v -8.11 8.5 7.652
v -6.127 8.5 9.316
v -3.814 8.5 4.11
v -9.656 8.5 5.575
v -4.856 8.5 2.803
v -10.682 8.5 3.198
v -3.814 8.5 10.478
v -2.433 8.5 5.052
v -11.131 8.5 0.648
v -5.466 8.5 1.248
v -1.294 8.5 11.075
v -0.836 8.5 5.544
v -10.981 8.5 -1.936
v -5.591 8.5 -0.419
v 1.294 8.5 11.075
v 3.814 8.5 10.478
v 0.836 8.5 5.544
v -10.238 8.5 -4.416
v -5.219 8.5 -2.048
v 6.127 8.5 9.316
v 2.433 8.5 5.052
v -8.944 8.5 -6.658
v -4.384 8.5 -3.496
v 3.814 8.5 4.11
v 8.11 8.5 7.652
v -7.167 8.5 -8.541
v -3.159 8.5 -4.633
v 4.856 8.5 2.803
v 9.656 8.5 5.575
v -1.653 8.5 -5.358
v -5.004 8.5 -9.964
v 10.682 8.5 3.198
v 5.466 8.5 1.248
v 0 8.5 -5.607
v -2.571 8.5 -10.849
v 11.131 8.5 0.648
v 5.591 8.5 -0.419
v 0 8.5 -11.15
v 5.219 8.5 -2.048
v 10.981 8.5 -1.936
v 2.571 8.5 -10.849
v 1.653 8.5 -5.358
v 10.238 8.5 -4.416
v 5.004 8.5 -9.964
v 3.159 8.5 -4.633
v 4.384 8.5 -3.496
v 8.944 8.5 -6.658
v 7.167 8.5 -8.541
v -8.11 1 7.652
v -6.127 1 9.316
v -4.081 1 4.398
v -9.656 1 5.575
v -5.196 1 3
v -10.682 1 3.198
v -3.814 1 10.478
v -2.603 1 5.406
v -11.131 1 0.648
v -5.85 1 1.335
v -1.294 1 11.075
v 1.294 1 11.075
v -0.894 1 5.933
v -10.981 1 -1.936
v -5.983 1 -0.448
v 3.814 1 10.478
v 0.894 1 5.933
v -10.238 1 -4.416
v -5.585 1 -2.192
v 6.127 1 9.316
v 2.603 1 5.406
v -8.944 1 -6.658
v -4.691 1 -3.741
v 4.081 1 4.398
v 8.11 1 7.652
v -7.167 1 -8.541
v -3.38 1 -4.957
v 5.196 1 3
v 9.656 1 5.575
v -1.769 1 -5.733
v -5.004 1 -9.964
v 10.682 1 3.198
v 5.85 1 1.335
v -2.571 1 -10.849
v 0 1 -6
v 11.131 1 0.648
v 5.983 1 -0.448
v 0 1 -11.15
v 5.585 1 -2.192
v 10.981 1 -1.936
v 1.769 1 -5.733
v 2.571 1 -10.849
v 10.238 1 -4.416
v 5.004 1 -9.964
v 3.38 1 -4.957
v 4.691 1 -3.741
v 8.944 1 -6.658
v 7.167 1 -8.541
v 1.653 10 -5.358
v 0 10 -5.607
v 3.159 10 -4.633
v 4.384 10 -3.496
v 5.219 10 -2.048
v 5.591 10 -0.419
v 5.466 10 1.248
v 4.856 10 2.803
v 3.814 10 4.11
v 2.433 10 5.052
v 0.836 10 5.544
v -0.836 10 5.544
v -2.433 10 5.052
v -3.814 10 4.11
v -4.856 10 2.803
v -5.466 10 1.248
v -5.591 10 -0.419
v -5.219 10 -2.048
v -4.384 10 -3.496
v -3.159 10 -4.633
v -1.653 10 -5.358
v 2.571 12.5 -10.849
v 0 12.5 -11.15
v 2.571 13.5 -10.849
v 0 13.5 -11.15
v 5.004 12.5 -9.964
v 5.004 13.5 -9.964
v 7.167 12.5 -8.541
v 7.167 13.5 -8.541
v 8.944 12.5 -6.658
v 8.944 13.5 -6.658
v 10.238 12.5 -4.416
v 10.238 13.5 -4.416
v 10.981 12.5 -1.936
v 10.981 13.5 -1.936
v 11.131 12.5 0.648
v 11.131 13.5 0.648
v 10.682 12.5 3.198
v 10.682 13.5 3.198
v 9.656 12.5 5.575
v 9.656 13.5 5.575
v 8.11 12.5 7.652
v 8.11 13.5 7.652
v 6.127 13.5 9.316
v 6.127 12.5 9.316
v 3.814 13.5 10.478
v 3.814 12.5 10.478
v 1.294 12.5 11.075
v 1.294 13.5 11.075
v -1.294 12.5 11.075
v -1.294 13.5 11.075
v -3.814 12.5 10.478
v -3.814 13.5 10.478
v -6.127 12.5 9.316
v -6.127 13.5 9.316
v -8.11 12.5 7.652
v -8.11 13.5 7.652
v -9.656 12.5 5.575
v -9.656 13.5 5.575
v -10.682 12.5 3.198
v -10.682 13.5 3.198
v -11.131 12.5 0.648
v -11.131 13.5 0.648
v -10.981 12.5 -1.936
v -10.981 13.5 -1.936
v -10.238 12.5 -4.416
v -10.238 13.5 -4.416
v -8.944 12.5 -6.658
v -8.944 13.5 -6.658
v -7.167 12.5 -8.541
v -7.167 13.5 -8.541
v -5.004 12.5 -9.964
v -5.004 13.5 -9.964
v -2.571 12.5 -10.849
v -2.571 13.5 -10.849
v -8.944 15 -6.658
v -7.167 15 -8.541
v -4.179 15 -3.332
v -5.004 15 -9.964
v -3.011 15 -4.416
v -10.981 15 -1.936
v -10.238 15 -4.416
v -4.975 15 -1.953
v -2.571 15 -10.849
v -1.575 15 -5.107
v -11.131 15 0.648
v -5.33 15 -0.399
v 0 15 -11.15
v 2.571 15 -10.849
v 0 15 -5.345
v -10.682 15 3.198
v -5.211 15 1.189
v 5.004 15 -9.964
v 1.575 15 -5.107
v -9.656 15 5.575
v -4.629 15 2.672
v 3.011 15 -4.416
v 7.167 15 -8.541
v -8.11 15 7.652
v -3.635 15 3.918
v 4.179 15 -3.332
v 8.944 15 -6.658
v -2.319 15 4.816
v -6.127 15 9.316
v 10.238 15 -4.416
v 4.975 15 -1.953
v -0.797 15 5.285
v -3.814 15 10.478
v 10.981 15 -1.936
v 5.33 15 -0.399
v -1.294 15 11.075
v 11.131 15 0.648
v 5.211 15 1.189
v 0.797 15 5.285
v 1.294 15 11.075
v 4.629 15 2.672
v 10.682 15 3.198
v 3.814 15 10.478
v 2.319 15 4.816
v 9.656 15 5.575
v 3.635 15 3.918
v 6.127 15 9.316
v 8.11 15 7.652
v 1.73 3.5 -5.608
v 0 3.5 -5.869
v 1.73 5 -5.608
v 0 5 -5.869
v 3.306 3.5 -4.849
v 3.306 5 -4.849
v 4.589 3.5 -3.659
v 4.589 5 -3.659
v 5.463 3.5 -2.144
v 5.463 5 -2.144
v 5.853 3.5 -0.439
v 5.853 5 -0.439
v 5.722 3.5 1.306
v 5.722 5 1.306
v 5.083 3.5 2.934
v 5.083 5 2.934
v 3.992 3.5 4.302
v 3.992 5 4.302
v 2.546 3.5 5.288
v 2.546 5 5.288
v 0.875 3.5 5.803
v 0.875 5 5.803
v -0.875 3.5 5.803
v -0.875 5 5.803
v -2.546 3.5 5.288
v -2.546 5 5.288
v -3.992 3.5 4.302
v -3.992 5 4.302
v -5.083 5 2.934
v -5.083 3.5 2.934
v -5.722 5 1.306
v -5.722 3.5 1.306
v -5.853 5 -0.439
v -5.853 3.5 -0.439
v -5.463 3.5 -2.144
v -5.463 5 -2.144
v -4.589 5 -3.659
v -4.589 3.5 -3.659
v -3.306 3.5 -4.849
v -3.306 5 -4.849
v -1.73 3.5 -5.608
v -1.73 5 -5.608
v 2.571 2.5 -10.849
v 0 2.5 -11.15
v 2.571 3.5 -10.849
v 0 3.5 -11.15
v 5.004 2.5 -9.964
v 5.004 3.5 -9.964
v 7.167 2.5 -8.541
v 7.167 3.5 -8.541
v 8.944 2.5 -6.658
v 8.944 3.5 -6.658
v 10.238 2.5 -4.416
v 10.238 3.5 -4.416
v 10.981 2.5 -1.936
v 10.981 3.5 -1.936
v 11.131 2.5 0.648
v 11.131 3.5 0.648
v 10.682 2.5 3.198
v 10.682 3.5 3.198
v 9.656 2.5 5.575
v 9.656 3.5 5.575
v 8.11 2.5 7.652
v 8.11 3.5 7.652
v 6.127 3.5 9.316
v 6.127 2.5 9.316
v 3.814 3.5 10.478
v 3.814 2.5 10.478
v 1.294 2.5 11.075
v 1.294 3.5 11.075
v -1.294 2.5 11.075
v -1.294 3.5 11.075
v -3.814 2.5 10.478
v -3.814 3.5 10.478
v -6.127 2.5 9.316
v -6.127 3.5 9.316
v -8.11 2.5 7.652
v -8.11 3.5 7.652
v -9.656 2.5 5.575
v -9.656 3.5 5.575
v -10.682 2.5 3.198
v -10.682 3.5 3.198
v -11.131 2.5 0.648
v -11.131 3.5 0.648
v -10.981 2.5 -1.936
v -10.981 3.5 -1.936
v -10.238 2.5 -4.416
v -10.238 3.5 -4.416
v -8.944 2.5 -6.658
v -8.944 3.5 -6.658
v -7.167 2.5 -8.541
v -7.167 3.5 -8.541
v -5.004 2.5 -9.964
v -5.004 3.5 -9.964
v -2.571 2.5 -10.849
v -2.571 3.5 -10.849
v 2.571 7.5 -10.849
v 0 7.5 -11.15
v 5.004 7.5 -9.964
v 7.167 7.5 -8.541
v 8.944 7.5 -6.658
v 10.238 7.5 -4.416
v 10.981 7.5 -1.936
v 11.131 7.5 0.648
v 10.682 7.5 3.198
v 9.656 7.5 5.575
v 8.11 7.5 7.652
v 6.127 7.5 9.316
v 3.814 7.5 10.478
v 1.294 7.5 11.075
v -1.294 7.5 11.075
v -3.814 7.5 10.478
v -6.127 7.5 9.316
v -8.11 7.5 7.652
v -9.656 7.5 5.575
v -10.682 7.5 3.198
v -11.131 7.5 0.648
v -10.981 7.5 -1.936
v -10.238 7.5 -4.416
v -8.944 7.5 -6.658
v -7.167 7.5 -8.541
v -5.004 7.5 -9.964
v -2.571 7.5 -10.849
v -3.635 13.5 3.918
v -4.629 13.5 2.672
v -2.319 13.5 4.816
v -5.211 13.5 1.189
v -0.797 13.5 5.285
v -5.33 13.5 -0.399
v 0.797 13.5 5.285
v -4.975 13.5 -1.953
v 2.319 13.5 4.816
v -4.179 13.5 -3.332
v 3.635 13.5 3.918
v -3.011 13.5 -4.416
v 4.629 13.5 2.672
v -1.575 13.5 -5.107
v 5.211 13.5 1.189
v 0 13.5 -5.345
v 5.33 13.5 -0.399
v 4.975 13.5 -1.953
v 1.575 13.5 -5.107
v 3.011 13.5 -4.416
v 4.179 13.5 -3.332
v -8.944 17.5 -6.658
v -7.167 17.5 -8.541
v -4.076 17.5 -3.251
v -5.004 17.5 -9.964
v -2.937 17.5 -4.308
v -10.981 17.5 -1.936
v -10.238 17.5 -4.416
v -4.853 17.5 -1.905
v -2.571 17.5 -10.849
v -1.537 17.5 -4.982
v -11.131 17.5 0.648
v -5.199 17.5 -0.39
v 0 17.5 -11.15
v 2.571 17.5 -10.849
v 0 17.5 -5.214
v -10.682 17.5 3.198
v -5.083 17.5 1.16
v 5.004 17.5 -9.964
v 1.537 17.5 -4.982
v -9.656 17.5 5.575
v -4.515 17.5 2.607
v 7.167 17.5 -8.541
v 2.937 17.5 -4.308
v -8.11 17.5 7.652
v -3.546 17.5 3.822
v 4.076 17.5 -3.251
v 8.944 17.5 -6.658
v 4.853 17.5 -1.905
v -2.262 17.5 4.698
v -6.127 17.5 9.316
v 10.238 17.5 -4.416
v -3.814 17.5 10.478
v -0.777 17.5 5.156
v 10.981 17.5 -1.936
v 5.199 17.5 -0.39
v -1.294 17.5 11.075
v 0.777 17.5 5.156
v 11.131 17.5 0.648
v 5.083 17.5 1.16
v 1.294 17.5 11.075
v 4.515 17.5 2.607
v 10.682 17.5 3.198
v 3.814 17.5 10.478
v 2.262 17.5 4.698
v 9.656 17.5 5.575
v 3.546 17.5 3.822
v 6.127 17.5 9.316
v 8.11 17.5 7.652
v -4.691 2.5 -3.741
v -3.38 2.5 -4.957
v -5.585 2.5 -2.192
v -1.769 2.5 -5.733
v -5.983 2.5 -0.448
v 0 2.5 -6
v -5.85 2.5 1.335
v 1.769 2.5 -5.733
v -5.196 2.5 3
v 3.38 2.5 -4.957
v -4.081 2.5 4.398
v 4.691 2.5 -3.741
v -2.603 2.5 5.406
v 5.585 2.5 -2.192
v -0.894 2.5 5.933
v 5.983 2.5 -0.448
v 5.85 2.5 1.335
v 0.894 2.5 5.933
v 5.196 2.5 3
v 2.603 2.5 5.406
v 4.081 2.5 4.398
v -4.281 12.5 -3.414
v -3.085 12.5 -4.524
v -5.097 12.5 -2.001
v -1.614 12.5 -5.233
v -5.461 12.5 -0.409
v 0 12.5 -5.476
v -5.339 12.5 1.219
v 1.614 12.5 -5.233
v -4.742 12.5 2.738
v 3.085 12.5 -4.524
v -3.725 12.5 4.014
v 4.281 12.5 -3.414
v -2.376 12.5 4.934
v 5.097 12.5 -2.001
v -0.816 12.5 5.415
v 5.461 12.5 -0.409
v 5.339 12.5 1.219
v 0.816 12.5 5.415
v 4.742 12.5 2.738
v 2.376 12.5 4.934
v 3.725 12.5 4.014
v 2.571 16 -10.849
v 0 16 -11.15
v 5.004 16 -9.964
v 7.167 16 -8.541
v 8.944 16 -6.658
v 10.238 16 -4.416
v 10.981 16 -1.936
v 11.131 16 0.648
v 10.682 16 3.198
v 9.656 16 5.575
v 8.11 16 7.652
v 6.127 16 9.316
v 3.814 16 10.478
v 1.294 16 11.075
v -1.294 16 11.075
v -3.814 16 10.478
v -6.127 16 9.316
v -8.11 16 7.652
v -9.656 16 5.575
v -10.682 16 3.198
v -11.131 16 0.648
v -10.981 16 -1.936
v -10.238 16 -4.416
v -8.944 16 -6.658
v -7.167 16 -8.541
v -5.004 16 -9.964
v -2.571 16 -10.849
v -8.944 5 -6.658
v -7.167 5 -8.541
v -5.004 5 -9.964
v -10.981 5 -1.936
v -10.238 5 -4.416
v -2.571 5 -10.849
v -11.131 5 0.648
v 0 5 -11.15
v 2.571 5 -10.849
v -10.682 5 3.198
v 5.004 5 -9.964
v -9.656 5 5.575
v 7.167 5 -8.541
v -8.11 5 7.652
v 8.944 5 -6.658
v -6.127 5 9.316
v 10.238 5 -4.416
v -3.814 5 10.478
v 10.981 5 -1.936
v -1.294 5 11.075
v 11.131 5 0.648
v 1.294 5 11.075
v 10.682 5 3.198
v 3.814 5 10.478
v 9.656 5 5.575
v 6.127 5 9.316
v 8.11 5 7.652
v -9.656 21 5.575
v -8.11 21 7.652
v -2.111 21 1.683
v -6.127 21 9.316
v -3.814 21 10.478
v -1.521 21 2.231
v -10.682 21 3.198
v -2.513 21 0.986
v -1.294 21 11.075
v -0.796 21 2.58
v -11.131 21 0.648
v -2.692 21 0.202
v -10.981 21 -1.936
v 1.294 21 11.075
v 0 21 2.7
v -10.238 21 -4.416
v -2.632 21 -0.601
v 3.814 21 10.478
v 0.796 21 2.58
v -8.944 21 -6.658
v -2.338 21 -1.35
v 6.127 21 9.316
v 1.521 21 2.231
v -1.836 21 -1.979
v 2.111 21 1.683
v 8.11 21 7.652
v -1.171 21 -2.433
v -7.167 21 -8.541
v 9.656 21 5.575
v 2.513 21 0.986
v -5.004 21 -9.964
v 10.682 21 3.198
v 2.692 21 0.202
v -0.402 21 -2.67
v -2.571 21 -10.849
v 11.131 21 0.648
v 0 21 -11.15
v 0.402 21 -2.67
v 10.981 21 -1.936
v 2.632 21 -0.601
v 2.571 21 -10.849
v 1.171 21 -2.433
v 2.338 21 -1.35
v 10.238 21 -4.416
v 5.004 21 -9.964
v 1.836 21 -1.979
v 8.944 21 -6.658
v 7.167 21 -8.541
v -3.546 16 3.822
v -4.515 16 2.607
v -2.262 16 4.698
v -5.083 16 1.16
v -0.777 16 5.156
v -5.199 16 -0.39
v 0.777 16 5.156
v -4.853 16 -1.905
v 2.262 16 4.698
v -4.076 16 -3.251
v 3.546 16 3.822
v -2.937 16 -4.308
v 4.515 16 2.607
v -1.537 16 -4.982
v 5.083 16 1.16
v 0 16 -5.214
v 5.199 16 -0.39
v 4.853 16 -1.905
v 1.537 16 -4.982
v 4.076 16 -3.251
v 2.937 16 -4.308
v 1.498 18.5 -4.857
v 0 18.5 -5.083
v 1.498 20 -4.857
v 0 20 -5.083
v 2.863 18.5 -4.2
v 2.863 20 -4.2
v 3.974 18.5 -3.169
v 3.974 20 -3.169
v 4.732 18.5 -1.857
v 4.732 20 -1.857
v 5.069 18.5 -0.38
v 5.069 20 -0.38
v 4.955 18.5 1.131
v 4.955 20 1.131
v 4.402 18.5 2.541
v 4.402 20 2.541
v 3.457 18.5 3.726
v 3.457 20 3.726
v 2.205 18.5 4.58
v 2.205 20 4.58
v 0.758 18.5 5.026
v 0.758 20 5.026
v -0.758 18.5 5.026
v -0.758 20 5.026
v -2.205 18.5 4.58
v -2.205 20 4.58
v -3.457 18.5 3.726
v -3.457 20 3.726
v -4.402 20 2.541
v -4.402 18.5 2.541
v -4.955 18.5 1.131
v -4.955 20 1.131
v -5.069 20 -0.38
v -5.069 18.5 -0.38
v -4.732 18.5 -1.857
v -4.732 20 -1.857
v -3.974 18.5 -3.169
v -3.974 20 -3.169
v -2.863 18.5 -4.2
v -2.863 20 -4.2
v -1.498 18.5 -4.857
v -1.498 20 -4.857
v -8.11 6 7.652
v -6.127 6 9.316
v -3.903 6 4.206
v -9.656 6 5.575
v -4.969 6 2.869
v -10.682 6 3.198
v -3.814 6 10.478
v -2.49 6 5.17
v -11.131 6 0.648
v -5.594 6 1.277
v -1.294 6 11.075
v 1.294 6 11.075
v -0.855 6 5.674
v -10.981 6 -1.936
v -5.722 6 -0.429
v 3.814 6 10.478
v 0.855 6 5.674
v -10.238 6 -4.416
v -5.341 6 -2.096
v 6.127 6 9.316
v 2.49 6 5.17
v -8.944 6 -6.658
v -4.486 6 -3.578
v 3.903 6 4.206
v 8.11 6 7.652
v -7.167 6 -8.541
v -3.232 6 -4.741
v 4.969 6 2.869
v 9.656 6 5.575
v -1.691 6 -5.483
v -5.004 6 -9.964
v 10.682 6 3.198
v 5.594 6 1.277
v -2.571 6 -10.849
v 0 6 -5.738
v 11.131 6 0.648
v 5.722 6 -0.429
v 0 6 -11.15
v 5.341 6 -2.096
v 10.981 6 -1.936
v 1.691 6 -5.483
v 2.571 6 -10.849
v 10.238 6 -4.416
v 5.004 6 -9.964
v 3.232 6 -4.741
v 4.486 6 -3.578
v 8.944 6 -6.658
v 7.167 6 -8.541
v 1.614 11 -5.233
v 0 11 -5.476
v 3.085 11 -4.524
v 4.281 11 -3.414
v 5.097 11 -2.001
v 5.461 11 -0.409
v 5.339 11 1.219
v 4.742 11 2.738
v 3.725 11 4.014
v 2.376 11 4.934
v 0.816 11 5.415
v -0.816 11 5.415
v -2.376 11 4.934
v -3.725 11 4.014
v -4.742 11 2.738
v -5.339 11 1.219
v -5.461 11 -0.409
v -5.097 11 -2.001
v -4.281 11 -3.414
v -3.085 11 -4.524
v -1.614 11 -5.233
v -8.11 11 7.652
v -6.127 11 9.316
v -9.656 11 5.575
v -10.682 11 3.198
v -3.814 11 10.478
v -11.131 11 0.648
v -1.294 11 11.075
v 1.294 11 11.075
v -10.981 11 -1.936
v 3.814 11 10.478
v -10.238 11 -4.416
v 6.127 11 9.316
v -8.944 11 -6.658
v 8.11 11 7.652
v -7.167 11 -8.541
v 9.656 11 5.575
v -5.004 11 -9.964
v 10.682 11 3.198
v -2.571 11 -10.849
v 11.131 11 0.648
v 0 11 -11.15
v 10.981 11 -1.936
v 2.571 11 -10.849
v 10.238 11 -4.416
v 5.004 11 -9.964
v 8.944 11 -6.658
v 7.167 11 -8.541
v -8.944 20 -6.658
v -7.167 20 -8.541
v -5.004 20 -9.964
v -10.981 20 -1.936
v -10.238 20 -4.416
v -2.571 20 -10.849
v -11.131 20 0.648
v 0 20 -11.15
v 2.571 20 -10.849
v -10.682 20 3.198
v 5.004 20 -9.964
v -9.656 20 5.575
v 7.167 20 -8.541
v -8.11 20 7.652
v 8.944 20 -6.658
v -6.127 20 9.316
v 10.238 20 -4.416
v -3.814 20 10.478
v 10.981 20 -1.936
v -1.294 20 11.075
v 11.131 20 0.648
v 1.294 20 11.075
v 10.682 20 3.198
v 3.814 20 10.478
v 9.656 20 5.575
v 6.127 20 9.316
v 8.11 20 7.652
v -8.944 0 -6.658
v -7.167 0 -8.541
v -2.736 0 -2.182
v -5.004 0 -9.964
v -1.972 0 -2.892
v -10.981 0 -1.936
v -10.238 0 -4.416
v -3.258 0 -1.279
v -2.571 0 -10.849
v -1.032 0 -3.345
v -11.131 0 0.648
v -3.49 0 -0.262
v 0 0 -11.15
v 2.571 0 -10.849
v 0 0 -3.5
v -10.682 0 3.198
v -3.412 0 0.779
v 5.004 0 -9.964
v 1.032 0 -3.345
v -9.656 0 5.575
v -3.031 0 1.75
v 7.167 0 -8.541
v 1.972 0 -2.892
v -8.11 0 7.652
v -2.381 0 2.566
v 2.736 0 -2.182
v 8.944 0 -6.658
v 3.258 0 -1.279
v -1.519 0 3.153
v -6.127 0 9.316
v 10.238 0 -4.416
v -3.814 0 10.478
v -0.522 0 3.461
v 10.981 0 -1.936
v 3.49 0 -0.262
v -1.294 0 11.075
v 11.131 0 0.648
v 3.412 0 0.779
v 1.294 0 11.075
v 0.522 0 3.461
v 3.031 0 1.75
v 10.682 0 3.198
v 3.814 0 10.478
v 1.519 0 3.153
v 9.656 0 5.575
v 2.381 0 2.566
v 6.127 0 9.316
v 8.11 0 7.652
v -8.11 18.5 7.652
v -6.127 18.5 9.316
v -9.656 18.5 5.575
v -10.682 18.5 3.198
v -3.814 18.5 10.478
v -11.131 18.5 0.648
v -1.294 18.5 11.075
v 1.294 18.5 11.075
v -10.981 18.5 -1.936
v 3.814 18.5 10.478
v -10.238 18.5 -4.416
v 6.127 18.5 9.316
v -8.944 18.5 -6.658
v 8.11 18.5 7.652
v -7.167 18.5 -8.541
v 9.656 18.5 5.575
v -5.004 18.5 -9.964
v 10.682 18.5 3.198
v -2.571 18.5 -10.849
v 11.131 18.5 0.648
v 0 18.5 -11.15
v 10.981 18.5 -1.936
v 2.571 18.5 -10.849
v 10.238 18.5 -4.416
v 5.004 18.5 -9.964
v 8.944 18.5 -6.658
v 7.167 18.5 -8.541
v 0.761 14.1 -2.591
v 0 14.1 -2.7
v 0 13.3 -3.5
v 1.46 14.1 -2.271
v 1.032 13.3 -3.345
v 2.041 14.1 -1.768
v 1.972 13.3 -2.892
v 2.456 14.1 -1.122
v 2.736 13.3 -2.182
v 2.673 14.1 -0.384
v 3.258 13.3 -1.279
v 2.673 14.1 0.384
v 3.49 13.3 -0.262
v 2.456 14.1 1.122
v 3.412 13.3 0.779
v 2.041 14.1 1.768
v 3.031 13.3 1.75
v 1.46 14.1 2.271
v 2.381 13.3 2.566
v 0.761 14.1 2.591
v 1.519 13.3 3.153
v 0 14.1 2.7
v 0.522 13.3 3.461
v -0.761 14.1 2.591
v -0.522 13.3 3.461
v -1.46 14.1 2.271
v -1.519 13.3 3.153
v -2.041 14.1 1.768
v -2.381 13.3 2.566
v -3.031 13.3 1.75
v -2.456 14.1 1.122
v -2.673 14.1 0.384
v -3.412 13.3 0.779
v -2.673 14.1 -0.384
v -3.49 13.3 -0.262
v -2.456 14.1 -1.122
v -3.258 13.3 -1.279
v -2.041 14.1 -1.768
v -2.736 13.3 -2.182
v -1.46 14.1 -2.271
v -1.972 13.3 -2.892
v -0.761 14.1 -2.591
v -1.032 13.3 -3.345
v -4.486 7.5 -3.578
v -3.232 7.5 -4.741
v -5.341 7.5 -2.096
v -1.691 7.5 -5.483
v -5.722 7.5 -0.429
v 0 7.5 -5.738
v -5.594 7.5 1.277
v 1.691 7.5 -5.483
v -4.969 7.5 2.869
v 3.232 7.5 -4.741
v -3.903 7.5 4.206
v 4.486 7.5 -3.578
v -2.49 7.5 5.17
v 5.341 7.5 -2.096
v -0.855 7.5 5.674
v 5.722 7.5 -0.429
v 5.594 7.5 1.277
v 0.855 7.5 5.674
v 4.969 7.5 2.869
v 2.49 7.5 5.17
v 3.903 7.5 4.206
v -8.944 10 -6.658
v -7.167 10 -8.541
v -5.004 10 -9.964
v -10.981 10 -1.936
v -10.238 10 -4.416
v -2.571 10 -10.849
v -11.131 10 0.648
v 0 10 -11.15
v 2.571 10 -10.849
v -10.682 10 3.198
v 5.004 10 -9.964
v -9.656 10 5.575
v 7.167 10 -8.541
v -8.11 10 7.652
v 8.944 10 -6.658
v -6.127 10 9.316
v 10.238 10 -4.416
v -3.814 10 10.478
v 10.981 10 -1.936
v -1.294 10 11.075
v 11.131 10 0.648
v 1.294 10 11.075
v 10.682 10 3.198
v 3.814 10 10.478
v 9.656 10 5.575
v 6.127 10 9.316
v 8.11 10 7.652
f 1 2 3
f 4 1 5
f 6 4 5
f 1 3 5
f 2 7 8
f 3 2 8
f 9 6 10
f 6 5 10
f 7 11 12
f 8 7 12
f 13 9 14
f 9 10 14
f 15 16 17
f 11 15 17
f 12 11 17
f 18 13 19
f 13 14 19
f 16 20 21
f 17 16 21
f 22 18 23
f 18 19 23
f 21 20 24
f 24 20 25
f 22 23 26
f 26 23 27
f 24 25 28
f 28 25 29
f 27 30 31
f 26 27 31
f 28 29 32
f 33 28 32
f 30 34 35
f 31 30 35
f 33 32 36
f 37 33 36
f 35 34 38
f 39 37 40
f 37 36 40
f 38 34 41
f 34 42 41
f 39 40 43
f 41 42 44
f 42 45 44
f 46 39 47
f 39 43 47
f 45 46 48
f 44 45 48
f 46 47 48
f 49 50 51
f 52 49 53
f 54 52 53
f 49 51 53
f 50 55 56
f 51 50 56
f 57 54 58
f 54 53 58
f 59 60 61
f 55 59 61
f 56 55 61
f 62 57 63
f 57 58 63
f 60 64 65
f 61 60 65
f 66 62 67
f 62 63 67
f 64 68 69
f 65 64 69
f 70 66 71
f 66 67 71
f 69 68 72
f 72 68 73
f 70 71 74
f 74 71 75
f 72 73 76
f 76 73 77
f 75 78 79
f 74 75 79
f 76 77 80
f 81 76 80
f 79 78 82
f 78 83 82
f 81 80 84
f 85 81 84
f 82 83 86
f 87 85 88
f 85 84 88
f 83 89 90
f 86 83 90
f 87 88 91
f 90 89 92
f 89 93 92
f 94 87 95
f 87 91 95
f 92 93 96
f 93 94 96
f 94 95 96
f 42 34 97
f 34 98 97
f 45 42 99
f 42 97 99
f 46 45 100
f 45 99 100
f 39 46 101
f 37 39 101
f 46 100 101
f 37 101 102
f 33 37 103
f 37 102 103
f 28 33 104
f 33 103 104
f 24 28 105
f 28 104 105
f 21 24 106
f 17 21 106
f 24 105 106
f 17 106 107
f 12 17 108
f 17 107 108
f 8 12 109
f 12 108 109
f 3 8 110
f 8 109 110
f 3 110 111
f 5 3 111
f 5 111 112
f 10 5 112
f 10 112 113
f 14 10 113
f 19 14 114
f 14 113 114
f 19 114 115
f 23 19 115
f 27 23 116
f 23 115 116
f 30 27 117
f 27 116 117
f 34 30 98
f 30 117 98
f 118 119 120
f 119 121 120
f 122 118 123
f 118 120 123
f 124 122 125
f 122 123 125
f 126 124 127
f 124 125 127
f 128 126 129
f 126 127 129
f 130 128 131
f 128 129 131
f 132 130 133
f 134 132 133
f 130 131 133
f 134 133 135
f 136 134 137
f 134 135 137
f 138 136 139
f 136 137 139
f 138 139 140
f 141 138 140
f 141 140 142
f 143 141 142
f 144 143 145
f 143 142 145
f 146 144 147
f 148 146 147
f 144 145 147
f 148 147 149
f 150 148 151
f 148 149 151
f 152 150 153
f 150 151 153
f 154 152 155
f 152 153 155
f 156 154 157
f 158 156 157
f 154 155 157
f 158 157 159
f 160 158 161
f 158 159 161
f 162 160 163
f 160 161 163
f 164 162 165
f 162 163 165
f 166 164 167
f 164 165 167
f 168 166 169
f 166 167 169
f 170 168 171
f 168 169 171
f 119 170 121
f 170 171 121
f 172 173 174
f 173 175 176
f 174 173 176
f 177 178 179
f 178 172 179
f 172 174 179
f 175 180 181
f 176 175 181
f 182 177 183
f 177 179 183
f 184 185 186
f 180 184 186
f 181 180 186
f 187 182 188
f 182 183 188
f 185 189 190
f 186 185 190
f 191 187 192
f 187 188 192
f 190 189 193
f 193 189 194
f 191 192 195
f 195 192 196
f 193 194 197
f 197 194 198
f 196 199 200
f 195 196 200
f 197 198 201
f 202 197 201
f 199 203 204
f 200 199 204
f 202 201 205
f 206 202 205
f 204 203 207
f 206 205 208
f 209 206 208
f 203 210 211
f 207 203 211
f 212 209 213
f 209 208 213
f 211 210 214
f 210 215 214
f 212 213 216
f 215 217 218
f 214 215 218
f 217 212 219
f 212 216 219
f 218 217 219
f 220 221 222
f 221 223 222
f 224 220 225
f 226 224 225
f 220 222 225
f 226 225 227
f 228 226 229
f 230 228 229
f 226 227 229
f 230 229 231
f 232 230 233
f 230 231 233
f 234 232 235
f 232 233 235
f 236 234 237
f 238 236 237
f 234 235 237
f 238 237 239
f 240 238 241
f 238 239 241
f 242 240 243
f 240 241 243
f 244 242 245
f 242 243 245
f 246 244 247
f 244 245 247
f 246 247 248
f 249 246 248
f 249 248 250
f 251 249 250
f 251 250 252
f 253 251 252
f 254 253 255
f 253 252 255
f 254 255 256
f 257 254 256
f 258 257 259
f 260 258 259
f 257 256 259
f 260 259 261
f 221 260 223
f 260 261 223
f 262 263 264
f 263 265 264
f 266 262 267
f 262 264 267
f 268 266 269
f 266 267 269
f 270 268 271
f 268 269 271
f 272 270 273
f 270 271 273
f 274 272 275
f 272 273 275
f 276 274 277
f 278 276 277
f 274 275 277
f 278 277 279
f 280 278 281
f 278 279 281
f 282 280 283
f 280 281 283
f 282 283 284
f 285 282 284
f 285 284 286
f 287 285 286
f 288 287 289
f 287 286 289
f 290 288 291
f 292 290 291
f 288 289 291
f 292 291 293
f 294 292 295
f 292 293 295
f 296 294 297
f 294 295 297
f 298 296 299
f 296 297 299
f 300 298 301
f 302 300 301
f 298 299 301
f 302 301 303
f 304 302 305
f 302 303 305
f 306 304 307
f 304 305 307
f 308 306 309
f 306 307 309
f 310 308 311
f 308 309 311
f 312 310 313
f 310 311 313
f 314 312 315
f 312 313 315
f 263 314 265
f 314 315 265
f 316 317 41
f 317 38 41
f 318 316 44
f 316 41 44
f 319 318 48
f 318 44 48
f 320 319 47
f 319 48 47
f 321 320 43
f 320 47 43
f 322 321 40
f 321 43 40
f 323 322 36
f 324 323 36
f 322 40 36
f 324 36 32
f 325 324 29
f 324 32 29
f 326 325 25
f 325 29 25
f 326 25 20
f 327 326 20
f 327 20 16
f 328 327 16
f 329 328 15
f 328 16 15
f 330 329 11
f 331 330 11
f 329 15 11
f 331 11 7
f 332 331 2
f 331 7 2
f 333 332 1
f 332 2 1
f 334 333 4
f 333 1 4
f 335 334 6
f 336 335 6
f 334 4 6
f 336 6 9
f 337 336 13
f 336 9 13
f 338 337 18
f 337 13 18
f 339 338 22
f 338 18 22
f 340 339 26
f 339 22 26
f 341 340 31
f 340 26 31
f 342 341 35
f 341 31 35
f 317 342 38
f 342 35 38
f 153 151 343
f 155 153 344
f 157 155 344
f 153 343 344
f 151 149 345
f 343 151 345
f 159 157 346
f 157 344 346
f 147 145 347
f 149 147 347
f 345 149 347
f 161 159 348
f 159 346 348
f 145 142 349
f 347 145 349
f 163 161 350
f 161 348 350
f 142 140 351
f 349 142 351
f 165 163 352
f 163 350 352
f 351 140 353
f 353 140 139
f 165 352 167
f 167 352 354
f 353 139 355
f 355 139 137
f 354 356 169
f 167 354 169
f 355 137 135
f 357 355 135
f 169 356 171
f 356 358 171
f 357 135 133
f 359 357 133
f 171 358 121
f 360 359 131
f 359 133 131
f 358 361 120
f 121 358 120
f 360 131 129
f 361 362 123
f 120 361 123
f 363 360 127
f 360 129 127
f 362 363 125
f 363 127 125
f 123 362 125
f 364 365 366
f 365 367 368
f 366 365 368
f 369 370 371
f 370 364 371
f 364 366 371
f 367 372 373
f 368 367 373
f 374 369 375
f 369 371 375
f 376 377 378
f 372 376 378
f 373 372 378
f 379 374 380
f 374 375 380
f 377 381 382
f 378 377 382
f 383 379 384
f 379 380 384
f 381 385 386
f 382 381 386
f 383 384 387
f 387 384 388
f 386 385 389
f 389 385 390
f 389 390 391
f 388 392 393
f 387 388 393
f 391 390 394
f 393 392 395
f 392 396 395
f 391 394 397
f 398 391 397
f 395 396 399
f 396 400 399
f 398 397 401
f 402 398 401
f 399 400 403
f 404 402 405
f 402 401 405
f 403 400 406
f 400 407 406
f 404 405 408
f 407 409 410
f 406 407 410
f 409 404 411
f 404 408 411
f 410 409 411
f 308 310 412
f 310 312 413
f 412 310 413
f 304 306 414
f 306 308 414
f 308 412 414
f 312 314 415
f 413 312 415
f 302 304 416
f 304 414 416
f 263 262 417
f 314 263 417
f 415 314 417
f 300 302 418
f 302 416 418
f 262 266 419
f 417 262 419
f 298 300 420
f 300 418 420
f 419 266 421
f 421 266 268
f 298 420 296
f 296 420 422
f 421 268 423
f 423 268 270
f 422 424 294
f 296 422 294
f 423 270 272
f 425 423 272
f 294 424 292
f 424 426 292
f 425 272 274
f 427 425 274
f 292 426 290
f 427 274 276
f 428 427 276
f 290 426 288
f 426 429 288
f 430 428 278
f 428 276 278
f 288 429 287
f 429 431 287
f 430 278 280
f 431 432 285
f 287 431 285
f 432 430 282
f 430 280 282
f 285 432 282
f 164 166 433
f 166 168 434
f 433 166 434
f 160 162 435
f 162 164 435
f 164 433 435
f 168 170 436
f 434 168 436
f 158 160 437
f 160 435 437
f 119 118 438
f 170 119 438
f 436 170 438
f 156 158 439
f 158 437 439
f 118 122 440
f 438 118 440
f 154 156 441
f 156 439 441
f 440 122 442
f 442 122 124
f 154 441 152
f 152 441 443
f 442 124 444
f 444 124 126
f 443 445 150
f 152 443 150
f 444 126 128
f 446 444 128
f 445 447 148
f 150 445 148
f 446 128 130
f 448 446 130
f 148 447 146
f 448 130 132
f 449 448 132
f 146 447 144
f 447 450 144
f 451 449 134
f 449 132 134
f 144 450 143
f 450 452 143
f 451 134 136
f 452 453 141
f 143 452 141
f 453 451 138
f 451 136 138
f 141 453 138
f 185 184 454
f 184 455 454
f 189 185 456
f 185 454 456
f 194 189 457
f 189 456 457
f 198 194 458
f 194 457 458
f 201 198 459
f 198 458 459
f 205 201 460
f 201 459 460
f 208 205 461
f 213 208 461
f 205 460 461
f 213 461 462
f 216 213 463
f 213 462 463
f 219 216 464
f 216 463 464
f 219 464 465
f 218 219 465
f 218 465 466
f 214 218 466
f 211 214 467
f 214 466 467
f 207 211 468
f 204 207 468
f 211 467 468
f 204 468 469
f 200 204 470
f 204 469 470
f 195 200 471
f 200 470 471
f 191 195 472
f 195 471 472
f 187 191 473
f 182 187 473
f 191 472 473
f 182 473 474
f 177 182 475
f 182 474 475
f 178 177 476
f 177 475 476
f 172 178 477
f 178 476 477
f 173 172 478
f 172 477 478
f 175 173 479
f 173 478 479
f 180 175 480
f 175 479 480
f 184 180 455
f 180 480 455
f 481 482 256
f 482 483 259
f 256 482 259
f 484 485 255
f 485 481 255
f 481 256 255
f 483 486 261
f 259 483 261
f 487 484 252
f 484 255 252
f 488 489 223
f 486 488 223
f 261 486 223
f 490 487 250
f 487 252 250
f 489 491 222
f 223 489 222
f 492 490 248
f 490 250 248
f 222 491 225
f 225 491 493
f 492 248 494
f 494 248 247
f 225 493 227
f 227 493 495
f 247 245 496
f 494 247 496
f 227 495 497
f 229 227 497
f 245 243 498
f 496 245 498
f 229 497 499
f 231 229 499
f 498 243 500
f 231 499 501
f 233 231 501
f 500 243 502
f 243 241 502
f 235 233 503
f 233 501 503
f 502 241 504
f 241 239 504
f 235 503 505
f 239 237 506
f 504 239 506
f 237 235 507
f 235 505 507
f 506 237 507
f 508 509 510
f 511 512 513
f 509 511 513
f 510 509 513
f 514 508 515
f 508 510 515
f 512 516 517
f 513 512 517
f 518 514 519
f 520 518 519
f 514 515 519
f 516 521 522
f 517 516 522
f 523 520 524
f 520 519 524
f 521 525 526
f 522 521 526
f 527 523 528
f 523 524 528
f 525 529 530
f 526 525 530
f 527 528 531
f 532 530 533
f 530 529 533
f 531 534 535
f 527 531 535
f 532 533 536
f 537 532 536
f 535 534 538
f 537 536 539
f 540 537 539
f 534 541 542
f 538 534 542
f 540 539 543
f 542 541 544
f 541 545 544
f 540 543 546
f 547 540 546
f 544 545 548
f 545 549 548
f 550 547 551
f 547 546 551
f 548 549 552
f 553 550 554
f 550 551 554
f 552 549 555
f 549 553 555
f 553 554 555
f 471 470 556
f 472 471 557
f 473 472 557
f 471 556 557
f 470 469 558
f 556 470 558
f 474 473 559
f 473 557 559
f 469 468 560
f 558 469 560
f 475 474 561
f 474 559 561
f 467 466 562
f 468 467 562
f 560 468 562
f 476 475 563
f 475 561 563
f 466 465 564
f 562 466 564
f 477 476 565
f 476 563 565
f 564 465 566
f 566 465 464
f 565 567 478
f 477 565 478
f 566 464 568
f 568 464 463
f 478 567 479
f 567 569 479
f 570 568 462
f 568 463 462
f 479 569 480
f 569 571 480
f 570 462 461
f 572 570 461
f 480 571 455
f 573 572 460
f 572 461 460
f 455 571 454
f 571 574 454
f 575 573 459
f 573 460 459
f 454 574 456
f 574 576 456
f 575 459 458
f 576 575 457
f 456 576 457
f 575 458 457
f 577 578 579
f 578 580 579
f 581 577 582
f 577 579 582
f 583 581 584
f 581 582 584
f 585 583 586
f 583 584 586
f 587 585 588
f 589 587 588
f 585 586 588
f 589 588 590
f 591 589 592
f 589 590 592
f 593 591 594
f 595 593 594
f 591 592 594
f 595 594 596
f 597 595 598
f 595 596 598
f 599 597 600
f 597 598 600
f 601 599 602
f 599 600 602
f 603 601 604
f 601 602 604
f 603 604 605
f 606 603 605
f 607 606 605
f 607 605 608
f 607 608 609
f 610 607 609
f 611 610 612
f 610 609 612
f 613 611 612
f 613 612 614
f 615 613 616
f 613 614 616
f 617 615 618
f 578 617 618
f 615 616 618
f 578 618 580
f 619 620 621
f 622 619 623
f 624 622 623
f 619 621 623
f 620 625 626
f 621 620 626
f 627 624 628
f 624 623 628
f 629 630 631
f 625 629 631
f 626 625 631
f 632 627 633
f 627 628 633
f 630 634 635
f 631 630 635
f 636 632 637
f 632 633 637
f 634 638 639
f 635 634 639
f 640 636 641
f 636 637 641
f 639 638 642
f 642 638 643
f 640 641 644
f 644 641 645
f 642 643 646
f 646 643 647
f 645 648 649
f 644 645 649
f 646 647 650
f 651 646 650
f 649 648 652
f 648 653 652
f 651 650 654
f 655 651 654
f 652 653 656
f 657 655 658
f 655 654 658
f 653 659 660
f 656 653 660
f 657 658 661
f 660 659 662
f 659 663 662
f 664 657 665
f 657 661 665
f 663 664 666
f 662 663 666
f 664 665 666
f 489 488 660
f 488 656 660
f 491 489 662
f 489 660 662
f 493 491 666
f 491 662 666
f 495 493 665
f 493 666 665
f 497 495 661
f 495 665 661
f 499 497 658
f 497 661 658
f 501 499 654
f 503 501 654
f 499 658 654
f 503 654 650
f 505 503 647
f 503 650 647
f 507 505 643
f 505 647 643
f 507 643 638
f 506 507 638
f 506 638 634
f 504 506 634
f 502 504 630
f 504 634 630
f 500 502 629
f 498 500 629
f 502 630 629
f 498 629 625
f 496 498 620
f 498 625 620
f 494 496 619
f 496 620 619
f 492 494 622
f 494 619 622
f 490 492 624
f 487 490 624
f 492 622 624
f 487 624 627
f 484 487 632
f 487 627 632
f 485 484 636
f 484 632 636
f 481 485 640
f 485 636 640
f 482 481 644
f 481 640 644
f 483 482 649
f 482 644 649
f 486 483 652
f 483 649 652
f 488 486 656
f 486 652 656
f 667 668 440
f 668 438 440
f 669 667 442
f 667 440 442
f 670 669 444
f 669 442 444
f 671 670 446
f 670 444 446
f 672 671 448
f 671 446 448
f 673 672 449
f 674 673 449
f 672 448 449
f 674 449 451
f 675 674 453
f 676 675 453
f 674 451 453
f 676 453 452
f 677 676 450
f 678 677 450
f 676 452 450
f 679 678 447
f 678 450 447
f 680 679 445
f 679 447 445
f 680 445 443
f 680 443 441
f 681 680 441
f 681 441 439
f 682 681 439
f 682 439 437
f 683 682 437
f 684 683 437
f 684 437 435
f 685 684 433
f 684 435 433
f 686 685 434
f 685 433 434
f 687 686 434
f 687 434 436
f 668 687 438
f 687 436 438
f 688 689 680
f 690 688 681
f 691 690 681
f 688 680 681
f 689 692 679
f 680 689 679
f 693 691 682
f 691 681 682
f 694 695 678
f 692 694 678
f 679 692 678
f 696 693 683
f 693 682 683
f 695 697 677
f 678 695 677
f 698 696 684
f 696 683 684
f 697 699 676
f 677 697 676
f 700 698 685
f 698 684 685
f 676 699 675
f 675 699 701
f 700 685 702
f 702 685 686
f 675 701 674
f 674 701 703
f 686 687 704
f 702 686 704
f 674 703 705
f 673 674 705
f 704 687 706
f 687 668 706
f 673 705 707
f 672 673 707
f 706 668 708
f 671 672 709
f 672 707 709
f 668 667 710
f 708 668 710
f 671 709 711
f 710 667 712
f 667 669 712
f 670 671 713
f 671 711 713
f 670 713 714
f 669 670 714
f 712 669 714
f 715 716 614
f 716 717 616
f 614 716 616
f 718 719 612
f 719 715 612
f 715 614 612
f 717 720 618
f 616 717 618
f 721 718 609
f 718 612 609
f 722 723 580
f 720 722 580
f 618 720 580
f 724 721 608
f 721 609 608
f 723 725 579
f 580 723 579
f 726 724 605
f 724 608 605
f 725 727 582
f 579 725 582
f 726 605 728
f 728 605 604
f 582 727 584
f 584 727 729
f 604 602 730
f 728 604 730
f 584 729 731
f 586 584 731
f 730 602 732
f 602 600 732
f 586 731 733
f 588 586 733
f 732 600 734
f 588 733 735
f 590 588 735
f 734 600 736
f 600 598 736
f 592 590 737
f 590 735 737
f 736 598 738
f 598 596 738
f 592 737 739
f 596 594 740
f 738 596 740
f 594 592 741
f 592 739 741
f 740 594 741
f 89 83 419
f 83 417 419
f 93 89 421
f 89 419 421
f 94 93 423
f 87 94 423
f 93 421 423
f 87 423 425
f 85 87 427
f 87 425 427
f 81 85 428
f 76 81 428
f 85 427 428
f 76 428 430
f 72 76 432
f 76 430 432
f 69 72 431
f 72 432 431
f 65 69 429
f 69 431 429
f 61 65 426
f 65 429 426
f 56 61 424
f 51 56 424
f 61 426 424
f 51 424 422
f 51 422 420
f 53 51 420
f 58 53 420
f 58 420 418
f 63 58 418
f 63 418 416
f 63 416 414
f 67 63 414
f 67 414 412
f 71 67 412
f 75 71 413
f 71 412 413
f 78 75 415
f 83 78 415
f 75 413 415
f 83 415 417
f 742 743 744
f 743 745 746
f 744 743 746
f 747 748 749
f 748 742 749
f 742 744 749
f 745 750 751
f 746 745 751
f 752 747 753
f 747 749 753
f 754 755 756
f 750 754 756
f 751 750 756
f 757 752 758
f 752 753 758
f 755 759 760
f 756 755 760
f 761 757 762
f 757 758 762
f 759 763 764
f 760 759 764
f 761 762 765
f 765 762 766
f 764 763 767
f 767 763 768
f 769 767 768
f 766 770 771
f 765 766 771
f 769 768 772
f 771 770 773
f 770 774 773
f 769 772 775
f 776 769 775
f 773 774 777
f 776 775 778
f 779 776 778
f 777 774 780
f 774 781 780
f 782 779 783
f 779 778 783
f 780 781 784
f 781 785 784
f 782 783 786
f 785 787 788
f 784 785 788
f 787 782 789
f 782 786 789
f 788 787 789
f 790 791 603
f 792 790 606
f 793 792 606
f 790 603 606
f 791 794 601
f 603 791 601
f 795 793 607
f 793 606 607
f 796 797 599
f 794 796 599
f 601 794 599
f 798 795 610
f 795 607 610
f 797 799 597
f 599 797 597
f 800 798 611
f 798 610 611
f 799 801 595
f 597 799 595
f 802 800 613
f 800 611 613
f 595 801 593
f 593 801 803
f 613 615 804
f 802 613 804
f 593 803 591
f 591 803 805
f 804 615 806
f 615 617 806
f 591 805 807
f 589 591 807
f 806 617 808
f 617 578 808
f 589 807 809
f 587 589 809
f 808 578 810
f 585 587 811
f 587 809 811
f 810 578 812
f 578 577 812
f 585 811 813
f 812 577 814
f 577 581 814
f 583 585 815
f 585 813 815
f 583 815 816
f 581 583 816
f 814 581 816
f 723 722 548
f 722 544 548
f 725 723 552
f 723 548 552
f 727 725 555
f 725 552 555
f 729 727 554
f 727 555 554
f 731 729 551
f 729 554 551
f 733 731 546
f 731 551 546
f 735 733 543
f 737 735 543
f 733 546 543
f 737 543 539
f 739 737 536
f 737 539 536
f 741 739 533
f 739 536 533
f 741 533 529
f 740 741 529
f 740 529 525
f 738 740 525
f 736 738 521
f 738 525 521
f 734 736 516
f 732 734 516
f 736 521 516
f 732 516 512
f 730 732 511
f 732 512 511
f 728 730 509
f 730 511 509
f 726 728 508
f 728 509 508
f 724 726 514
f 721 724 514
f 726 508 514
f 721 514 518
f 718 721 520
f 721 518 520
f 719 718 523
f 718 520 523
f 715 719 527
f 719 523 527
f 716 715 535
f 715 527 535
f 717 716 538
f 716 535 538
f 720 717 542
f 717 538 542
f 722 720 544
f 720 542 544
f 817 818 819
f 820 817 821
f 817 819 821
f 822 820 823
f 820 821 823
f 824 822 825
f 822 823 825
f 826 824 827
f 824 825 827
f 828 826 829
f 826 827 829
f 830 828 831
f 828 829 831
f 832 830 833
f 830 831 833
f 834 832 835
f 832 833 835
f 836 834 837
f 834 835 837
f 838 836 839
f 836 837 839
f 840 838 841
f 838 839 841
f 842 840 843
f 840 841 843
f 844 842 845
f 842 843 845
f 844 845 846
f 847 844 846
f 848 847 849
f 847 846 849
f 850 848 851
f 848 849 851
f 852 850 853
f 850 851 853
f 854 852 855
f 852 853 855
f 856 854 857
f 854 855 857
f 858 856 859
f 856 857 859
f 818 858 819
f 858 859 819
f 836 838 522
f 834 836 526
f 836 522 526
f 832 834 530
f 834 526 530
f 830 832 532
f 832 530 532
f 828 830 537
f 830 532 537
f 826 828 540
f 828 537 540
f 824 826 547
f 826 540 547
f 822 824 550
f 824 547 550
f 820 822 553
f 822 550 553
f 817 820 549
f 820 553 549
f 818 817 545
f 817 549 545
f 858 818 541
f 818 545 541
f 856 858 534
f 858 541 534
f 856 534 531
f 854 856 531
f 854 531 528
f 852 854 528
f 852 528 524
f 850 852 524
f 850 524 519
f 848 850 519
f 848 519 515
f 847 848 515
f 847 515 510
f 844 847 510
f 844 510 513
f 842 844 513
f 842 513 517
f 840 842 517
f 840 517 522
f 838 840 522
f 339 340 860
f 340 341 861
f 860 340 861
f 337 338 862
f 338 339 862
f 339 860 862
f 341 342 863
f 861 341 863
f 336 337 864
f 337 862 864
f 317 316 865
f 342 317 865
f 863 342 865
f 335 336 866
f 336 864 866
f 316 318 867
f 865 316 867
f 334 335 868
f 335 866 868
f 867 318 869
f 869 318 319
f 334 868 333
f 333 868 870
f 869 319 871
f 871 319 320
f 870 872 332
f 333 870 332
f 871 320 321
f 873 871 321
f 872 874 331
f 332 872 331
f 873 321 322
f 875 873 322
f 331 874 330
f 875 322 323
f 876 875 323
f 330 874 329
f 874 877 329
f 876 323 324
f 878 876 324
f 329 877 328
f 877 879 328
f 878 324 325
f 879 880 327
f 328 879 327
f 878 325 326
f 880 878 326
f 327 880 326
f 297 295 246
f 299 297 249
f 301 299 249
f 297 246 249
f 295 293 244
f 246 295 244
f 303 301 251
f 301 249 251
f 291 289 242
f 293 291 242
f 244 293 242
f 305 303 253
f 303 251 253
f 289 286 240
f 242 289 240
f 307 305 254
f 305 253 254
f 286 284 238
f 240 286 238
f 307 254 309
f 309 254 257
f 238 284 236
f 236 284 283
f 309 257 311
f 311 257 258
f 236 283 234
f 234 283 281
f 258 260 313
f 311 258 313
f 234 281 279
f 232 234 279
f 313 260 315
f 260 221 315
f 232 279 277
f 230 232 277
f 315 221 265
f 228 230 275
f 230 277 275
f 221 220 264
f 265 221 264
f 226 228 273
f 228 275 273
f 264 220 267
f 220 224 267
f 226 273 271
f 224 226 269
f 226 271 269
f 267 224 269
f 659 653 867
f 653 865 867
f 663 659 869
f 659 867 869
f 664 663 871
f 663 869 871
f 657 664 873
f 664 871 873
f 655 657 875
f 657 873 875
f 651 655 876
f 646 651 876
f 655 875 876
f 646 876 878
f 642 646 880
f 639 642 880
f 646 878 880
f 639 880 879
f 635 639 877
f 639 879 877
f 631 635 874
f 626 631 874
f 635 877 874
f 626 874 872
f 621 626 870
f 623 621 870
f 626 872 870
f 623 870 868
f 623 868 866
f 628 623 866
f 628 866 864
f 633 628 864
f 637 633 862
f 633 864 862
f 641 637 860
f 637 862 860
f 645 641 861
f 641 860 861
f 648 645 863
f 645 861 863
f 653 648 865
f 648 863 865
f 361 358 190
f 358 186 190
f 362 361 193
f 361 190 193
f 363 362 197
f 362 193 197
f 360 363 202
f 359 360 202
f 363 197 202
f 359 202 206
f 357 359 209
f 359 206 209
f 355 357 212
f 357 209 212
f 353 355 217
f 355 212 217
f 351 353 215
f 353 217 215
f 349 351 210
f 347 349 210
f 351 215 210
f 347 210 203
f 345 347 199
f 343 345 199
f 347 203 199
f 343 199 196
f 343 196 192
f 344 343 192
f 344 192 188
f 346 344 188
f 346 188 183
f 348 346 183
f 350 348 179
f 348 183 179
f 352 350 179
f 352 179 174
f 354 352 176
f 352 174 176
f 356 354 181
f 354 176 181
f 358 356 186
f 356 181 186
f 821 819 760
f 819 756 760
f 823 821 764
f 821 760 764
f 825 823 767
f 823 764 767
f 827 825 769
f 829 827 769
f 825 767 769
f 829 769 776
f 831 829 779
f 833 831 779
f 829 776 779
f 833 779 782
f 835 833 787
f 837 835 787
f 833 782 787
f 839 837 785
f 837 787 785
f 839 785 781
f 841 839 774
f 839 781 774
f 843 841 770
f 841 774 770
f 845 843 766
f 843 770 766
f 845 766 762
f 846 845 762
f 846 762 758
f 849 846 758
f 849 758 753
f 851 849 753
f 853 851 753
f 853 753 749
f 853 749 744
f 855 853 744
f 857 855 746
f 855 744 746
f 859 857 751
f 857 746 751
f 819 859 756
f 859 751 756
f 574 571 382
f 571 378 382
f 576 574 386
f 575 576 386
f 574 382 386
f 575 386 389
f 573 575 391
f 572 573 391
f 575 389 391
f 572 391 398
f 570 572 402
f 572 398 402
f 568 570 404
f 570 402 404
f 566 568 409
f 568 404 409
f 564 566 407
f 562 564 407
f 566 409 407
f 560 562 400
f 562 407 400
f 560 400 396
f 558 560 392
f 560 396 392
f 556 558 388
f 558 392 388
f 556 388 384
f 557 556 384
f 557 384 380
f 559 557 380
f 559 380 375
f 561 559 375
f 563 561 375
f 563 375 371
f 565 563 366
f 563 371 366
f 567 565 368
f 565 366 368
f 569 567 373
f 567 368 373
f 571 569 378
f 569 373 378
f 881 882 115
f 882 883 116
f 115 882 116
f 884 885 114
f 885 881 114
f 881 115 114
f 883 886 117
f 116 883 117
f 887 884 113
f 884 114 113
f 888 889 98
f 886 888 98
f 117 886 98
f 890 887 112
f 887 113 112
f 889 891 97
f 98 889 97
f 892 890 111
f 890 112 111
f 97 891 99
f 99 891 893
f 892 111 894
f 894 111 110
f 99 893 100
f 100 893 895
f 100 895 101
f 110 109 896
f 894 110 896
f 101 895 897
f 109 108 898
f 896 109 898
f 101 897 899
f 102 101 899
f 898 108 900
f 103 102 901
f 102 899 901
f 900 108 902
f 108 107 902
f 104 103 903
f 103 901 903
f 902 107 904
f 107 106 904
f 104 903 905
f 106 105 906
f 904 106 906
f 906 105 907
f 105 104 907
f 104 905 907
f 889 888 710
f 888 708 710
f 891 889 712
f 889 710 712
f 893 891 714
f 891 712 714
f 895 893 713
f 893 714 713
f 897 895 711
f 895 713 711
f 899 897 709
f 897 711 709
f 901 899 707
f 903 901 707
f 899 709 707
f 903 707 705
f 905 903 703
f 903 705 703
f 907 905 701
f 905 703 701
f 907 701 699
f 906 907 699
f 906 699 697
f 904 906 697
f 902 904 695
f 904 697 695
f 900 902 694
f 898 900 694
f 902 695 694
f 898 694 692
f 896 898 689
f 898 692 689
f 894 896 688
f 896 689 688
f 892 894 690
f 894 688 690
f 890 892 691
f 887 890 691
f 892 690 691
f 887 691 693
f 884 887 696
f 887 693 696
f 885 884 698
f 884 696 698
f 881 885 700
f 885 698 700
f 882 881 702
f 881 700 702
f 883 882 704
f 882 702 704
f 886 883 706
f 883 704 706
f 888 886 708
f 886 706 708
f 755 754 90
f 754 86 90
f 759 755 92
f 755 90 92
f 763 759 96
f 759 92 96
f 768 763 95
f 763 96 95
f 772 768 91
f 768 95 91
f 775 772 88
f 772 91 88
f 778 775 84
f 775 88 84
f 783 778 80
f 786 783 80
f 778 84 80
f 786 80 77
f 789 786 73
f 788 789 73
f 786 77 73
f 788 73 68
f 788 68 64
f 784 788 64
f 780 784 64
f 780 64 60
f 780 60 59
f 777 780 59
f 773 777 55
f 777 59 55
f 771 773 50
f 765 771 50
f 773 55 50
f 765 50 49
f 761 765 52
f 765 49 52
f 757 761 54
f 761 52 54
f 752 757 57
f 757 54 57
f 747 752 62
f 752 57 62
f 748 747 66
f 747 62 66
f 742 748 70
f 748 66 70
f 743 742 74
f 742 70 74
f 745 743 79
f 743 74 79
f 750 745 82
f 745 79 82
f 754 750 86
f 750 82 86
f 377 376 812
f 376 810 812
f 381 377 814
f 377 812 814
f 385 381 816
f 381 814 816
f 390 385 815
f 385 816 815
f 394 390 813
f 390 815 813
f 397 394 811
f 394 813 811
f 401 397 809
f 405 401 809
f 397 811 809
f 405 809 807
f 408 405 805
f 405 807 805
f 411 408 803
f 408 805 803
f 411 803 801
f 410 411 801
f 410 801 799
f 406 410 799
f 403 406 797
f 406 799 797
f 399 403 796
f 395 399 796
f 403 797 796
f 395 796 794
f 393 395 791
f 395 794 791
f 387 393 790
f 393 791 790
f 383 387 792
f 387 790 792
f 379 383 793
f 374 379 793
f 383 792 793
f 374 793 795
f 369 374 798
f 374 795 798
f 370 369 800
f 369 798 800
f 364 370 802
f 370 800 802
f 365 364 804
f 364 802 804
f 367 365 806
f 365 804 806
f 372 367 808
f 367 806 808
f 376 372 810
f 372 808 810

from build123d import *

# Parameters (mm, degrees)
CUT_EXTRUDE_1_REACH = 28.824
SKETCH_1_R          = 11.30959092
CUT_EXTRUDE_2_REACH = 28.261
SKETCH_2_R          = 2.7


with BuildPart() as part:
    # Sketch1 → Revolve1 (revolve)
    with BuildSketch(Plane.XY, mode=Mode.PRIVATE) as revolve1_sk:
        Polygon((11.15, 18.5), (5.082863863, 18.5), (5.082863863, 20), (11.15, 20), (11.15, 21), (4.951844414, 21), (4.951844414, 22.5), (11.15, 22.5), (11.15, 23.5), (4.820824966, 23.5), (4.820824966, 25), (11.15, 25), (11.15, 26), (4.689805518, 26), (4.689805518, 27.5), (8, 27.5), (8, 28.5), (4.689805518, 28.5), (4.689805518, 30), (8, 30), (8, 33), (6, 33), (6, 39), (8, 39), (8, 42.7), (4, 42.7), (4, 36.6), (2.1, 34.7), (2.1, 14.7), (3.5, 13.3), (3.5, 0), (11.15, 0), (11.15, 1), (6, 1), (6, 2.5), (11.15, 2.5), (11.15, 3.5), (5.868980552, 3.5), (5.868980552, 5), (11.15, 5), (11.15, 6), (5.737961104, 6), (5.737961104, 7.5), (11.15, 7.5), (11.15, 8.5), (5.606941655, 8.5), (5.606941655, 10), (11.15, 10), (11.15, 11), (5.475922207, 11), (5.475922207, 12.5), (11.15, 12.5), (11.15, 13.5), (5.344902759, 13.5), (5.344902759, 15), (11.15, 15), (11.15, 16), (5.213883311, 16), (5.213883311, 17.5), (11.15, 17.5), align=None)
    revolve(revolve1_sk.sketch.rotate(Axis((0, 42.7, 0), (0, -1, 0)), 270), axis=Axis((0, 42.7, 0), (0, -1, 0)))

    # Эскиз1 → Вырез-Вытянуть1 (cut, up to next)
    with BuildSketch(Plane(origin=(0, 21, 0), x_dir=(1, 0, 0), z_dir=(0, 1, 0)), mode=Mode.PRIVATE) as cut_extrude_1_sk1:
        Circle(SKETCH_1_R)
    cut_extrude_1_tool1 = extrude(cut_extrude_1_sk1.sketch, amount=CUT_EXTRUDE_1_REACH, mode=Mode.PRIVATE) & part.part
    add(cut_extrude_1_tool1.solids().sort_by_distance((0, 21, 0))[0], mode=Mode.SUBTRACT)

    # Вырез-Вытянуть2: up to this cone (the profile starts outside it)
    cut_extrude_2_end = Plane(origin=(0, 21, 0), z_dir=(0, -1, 0)).offset(4.200001) * Cone(1e-06, 24.561, 24.560999, align=(Align.CENTER, Align.CENTER, Align.MIN), mode=Mode.PRIVATE)
    # Эскиз2 → Вырез-Вытянуть2 (cut, up to the surface)
    with BuildSketch(Plane(origin=(0, 21, 0), x_dir=(1, 0, 0), z_dir=(0, 1, 0)), mode=Mode.PRIVATE) as cut_extrude_2_sk1:
        with Locations(Location((0, 0, 0), (0, 0, 270))):
            Circle(SKETCH_2_R)
    cut_extrude_2_tool1 = extrude(cut_extrude_2_sk1.sketch, amount=-CUT_EXTRUDE_2_REACH, mode=Mode.PRIVATE) - cut_extrude_2_end
    add(cut_extrude_2_tool1.solids().sort_by_distance((0, 21, 0))[0], mode=Mode.SUBTRACT)


solid = part.part
